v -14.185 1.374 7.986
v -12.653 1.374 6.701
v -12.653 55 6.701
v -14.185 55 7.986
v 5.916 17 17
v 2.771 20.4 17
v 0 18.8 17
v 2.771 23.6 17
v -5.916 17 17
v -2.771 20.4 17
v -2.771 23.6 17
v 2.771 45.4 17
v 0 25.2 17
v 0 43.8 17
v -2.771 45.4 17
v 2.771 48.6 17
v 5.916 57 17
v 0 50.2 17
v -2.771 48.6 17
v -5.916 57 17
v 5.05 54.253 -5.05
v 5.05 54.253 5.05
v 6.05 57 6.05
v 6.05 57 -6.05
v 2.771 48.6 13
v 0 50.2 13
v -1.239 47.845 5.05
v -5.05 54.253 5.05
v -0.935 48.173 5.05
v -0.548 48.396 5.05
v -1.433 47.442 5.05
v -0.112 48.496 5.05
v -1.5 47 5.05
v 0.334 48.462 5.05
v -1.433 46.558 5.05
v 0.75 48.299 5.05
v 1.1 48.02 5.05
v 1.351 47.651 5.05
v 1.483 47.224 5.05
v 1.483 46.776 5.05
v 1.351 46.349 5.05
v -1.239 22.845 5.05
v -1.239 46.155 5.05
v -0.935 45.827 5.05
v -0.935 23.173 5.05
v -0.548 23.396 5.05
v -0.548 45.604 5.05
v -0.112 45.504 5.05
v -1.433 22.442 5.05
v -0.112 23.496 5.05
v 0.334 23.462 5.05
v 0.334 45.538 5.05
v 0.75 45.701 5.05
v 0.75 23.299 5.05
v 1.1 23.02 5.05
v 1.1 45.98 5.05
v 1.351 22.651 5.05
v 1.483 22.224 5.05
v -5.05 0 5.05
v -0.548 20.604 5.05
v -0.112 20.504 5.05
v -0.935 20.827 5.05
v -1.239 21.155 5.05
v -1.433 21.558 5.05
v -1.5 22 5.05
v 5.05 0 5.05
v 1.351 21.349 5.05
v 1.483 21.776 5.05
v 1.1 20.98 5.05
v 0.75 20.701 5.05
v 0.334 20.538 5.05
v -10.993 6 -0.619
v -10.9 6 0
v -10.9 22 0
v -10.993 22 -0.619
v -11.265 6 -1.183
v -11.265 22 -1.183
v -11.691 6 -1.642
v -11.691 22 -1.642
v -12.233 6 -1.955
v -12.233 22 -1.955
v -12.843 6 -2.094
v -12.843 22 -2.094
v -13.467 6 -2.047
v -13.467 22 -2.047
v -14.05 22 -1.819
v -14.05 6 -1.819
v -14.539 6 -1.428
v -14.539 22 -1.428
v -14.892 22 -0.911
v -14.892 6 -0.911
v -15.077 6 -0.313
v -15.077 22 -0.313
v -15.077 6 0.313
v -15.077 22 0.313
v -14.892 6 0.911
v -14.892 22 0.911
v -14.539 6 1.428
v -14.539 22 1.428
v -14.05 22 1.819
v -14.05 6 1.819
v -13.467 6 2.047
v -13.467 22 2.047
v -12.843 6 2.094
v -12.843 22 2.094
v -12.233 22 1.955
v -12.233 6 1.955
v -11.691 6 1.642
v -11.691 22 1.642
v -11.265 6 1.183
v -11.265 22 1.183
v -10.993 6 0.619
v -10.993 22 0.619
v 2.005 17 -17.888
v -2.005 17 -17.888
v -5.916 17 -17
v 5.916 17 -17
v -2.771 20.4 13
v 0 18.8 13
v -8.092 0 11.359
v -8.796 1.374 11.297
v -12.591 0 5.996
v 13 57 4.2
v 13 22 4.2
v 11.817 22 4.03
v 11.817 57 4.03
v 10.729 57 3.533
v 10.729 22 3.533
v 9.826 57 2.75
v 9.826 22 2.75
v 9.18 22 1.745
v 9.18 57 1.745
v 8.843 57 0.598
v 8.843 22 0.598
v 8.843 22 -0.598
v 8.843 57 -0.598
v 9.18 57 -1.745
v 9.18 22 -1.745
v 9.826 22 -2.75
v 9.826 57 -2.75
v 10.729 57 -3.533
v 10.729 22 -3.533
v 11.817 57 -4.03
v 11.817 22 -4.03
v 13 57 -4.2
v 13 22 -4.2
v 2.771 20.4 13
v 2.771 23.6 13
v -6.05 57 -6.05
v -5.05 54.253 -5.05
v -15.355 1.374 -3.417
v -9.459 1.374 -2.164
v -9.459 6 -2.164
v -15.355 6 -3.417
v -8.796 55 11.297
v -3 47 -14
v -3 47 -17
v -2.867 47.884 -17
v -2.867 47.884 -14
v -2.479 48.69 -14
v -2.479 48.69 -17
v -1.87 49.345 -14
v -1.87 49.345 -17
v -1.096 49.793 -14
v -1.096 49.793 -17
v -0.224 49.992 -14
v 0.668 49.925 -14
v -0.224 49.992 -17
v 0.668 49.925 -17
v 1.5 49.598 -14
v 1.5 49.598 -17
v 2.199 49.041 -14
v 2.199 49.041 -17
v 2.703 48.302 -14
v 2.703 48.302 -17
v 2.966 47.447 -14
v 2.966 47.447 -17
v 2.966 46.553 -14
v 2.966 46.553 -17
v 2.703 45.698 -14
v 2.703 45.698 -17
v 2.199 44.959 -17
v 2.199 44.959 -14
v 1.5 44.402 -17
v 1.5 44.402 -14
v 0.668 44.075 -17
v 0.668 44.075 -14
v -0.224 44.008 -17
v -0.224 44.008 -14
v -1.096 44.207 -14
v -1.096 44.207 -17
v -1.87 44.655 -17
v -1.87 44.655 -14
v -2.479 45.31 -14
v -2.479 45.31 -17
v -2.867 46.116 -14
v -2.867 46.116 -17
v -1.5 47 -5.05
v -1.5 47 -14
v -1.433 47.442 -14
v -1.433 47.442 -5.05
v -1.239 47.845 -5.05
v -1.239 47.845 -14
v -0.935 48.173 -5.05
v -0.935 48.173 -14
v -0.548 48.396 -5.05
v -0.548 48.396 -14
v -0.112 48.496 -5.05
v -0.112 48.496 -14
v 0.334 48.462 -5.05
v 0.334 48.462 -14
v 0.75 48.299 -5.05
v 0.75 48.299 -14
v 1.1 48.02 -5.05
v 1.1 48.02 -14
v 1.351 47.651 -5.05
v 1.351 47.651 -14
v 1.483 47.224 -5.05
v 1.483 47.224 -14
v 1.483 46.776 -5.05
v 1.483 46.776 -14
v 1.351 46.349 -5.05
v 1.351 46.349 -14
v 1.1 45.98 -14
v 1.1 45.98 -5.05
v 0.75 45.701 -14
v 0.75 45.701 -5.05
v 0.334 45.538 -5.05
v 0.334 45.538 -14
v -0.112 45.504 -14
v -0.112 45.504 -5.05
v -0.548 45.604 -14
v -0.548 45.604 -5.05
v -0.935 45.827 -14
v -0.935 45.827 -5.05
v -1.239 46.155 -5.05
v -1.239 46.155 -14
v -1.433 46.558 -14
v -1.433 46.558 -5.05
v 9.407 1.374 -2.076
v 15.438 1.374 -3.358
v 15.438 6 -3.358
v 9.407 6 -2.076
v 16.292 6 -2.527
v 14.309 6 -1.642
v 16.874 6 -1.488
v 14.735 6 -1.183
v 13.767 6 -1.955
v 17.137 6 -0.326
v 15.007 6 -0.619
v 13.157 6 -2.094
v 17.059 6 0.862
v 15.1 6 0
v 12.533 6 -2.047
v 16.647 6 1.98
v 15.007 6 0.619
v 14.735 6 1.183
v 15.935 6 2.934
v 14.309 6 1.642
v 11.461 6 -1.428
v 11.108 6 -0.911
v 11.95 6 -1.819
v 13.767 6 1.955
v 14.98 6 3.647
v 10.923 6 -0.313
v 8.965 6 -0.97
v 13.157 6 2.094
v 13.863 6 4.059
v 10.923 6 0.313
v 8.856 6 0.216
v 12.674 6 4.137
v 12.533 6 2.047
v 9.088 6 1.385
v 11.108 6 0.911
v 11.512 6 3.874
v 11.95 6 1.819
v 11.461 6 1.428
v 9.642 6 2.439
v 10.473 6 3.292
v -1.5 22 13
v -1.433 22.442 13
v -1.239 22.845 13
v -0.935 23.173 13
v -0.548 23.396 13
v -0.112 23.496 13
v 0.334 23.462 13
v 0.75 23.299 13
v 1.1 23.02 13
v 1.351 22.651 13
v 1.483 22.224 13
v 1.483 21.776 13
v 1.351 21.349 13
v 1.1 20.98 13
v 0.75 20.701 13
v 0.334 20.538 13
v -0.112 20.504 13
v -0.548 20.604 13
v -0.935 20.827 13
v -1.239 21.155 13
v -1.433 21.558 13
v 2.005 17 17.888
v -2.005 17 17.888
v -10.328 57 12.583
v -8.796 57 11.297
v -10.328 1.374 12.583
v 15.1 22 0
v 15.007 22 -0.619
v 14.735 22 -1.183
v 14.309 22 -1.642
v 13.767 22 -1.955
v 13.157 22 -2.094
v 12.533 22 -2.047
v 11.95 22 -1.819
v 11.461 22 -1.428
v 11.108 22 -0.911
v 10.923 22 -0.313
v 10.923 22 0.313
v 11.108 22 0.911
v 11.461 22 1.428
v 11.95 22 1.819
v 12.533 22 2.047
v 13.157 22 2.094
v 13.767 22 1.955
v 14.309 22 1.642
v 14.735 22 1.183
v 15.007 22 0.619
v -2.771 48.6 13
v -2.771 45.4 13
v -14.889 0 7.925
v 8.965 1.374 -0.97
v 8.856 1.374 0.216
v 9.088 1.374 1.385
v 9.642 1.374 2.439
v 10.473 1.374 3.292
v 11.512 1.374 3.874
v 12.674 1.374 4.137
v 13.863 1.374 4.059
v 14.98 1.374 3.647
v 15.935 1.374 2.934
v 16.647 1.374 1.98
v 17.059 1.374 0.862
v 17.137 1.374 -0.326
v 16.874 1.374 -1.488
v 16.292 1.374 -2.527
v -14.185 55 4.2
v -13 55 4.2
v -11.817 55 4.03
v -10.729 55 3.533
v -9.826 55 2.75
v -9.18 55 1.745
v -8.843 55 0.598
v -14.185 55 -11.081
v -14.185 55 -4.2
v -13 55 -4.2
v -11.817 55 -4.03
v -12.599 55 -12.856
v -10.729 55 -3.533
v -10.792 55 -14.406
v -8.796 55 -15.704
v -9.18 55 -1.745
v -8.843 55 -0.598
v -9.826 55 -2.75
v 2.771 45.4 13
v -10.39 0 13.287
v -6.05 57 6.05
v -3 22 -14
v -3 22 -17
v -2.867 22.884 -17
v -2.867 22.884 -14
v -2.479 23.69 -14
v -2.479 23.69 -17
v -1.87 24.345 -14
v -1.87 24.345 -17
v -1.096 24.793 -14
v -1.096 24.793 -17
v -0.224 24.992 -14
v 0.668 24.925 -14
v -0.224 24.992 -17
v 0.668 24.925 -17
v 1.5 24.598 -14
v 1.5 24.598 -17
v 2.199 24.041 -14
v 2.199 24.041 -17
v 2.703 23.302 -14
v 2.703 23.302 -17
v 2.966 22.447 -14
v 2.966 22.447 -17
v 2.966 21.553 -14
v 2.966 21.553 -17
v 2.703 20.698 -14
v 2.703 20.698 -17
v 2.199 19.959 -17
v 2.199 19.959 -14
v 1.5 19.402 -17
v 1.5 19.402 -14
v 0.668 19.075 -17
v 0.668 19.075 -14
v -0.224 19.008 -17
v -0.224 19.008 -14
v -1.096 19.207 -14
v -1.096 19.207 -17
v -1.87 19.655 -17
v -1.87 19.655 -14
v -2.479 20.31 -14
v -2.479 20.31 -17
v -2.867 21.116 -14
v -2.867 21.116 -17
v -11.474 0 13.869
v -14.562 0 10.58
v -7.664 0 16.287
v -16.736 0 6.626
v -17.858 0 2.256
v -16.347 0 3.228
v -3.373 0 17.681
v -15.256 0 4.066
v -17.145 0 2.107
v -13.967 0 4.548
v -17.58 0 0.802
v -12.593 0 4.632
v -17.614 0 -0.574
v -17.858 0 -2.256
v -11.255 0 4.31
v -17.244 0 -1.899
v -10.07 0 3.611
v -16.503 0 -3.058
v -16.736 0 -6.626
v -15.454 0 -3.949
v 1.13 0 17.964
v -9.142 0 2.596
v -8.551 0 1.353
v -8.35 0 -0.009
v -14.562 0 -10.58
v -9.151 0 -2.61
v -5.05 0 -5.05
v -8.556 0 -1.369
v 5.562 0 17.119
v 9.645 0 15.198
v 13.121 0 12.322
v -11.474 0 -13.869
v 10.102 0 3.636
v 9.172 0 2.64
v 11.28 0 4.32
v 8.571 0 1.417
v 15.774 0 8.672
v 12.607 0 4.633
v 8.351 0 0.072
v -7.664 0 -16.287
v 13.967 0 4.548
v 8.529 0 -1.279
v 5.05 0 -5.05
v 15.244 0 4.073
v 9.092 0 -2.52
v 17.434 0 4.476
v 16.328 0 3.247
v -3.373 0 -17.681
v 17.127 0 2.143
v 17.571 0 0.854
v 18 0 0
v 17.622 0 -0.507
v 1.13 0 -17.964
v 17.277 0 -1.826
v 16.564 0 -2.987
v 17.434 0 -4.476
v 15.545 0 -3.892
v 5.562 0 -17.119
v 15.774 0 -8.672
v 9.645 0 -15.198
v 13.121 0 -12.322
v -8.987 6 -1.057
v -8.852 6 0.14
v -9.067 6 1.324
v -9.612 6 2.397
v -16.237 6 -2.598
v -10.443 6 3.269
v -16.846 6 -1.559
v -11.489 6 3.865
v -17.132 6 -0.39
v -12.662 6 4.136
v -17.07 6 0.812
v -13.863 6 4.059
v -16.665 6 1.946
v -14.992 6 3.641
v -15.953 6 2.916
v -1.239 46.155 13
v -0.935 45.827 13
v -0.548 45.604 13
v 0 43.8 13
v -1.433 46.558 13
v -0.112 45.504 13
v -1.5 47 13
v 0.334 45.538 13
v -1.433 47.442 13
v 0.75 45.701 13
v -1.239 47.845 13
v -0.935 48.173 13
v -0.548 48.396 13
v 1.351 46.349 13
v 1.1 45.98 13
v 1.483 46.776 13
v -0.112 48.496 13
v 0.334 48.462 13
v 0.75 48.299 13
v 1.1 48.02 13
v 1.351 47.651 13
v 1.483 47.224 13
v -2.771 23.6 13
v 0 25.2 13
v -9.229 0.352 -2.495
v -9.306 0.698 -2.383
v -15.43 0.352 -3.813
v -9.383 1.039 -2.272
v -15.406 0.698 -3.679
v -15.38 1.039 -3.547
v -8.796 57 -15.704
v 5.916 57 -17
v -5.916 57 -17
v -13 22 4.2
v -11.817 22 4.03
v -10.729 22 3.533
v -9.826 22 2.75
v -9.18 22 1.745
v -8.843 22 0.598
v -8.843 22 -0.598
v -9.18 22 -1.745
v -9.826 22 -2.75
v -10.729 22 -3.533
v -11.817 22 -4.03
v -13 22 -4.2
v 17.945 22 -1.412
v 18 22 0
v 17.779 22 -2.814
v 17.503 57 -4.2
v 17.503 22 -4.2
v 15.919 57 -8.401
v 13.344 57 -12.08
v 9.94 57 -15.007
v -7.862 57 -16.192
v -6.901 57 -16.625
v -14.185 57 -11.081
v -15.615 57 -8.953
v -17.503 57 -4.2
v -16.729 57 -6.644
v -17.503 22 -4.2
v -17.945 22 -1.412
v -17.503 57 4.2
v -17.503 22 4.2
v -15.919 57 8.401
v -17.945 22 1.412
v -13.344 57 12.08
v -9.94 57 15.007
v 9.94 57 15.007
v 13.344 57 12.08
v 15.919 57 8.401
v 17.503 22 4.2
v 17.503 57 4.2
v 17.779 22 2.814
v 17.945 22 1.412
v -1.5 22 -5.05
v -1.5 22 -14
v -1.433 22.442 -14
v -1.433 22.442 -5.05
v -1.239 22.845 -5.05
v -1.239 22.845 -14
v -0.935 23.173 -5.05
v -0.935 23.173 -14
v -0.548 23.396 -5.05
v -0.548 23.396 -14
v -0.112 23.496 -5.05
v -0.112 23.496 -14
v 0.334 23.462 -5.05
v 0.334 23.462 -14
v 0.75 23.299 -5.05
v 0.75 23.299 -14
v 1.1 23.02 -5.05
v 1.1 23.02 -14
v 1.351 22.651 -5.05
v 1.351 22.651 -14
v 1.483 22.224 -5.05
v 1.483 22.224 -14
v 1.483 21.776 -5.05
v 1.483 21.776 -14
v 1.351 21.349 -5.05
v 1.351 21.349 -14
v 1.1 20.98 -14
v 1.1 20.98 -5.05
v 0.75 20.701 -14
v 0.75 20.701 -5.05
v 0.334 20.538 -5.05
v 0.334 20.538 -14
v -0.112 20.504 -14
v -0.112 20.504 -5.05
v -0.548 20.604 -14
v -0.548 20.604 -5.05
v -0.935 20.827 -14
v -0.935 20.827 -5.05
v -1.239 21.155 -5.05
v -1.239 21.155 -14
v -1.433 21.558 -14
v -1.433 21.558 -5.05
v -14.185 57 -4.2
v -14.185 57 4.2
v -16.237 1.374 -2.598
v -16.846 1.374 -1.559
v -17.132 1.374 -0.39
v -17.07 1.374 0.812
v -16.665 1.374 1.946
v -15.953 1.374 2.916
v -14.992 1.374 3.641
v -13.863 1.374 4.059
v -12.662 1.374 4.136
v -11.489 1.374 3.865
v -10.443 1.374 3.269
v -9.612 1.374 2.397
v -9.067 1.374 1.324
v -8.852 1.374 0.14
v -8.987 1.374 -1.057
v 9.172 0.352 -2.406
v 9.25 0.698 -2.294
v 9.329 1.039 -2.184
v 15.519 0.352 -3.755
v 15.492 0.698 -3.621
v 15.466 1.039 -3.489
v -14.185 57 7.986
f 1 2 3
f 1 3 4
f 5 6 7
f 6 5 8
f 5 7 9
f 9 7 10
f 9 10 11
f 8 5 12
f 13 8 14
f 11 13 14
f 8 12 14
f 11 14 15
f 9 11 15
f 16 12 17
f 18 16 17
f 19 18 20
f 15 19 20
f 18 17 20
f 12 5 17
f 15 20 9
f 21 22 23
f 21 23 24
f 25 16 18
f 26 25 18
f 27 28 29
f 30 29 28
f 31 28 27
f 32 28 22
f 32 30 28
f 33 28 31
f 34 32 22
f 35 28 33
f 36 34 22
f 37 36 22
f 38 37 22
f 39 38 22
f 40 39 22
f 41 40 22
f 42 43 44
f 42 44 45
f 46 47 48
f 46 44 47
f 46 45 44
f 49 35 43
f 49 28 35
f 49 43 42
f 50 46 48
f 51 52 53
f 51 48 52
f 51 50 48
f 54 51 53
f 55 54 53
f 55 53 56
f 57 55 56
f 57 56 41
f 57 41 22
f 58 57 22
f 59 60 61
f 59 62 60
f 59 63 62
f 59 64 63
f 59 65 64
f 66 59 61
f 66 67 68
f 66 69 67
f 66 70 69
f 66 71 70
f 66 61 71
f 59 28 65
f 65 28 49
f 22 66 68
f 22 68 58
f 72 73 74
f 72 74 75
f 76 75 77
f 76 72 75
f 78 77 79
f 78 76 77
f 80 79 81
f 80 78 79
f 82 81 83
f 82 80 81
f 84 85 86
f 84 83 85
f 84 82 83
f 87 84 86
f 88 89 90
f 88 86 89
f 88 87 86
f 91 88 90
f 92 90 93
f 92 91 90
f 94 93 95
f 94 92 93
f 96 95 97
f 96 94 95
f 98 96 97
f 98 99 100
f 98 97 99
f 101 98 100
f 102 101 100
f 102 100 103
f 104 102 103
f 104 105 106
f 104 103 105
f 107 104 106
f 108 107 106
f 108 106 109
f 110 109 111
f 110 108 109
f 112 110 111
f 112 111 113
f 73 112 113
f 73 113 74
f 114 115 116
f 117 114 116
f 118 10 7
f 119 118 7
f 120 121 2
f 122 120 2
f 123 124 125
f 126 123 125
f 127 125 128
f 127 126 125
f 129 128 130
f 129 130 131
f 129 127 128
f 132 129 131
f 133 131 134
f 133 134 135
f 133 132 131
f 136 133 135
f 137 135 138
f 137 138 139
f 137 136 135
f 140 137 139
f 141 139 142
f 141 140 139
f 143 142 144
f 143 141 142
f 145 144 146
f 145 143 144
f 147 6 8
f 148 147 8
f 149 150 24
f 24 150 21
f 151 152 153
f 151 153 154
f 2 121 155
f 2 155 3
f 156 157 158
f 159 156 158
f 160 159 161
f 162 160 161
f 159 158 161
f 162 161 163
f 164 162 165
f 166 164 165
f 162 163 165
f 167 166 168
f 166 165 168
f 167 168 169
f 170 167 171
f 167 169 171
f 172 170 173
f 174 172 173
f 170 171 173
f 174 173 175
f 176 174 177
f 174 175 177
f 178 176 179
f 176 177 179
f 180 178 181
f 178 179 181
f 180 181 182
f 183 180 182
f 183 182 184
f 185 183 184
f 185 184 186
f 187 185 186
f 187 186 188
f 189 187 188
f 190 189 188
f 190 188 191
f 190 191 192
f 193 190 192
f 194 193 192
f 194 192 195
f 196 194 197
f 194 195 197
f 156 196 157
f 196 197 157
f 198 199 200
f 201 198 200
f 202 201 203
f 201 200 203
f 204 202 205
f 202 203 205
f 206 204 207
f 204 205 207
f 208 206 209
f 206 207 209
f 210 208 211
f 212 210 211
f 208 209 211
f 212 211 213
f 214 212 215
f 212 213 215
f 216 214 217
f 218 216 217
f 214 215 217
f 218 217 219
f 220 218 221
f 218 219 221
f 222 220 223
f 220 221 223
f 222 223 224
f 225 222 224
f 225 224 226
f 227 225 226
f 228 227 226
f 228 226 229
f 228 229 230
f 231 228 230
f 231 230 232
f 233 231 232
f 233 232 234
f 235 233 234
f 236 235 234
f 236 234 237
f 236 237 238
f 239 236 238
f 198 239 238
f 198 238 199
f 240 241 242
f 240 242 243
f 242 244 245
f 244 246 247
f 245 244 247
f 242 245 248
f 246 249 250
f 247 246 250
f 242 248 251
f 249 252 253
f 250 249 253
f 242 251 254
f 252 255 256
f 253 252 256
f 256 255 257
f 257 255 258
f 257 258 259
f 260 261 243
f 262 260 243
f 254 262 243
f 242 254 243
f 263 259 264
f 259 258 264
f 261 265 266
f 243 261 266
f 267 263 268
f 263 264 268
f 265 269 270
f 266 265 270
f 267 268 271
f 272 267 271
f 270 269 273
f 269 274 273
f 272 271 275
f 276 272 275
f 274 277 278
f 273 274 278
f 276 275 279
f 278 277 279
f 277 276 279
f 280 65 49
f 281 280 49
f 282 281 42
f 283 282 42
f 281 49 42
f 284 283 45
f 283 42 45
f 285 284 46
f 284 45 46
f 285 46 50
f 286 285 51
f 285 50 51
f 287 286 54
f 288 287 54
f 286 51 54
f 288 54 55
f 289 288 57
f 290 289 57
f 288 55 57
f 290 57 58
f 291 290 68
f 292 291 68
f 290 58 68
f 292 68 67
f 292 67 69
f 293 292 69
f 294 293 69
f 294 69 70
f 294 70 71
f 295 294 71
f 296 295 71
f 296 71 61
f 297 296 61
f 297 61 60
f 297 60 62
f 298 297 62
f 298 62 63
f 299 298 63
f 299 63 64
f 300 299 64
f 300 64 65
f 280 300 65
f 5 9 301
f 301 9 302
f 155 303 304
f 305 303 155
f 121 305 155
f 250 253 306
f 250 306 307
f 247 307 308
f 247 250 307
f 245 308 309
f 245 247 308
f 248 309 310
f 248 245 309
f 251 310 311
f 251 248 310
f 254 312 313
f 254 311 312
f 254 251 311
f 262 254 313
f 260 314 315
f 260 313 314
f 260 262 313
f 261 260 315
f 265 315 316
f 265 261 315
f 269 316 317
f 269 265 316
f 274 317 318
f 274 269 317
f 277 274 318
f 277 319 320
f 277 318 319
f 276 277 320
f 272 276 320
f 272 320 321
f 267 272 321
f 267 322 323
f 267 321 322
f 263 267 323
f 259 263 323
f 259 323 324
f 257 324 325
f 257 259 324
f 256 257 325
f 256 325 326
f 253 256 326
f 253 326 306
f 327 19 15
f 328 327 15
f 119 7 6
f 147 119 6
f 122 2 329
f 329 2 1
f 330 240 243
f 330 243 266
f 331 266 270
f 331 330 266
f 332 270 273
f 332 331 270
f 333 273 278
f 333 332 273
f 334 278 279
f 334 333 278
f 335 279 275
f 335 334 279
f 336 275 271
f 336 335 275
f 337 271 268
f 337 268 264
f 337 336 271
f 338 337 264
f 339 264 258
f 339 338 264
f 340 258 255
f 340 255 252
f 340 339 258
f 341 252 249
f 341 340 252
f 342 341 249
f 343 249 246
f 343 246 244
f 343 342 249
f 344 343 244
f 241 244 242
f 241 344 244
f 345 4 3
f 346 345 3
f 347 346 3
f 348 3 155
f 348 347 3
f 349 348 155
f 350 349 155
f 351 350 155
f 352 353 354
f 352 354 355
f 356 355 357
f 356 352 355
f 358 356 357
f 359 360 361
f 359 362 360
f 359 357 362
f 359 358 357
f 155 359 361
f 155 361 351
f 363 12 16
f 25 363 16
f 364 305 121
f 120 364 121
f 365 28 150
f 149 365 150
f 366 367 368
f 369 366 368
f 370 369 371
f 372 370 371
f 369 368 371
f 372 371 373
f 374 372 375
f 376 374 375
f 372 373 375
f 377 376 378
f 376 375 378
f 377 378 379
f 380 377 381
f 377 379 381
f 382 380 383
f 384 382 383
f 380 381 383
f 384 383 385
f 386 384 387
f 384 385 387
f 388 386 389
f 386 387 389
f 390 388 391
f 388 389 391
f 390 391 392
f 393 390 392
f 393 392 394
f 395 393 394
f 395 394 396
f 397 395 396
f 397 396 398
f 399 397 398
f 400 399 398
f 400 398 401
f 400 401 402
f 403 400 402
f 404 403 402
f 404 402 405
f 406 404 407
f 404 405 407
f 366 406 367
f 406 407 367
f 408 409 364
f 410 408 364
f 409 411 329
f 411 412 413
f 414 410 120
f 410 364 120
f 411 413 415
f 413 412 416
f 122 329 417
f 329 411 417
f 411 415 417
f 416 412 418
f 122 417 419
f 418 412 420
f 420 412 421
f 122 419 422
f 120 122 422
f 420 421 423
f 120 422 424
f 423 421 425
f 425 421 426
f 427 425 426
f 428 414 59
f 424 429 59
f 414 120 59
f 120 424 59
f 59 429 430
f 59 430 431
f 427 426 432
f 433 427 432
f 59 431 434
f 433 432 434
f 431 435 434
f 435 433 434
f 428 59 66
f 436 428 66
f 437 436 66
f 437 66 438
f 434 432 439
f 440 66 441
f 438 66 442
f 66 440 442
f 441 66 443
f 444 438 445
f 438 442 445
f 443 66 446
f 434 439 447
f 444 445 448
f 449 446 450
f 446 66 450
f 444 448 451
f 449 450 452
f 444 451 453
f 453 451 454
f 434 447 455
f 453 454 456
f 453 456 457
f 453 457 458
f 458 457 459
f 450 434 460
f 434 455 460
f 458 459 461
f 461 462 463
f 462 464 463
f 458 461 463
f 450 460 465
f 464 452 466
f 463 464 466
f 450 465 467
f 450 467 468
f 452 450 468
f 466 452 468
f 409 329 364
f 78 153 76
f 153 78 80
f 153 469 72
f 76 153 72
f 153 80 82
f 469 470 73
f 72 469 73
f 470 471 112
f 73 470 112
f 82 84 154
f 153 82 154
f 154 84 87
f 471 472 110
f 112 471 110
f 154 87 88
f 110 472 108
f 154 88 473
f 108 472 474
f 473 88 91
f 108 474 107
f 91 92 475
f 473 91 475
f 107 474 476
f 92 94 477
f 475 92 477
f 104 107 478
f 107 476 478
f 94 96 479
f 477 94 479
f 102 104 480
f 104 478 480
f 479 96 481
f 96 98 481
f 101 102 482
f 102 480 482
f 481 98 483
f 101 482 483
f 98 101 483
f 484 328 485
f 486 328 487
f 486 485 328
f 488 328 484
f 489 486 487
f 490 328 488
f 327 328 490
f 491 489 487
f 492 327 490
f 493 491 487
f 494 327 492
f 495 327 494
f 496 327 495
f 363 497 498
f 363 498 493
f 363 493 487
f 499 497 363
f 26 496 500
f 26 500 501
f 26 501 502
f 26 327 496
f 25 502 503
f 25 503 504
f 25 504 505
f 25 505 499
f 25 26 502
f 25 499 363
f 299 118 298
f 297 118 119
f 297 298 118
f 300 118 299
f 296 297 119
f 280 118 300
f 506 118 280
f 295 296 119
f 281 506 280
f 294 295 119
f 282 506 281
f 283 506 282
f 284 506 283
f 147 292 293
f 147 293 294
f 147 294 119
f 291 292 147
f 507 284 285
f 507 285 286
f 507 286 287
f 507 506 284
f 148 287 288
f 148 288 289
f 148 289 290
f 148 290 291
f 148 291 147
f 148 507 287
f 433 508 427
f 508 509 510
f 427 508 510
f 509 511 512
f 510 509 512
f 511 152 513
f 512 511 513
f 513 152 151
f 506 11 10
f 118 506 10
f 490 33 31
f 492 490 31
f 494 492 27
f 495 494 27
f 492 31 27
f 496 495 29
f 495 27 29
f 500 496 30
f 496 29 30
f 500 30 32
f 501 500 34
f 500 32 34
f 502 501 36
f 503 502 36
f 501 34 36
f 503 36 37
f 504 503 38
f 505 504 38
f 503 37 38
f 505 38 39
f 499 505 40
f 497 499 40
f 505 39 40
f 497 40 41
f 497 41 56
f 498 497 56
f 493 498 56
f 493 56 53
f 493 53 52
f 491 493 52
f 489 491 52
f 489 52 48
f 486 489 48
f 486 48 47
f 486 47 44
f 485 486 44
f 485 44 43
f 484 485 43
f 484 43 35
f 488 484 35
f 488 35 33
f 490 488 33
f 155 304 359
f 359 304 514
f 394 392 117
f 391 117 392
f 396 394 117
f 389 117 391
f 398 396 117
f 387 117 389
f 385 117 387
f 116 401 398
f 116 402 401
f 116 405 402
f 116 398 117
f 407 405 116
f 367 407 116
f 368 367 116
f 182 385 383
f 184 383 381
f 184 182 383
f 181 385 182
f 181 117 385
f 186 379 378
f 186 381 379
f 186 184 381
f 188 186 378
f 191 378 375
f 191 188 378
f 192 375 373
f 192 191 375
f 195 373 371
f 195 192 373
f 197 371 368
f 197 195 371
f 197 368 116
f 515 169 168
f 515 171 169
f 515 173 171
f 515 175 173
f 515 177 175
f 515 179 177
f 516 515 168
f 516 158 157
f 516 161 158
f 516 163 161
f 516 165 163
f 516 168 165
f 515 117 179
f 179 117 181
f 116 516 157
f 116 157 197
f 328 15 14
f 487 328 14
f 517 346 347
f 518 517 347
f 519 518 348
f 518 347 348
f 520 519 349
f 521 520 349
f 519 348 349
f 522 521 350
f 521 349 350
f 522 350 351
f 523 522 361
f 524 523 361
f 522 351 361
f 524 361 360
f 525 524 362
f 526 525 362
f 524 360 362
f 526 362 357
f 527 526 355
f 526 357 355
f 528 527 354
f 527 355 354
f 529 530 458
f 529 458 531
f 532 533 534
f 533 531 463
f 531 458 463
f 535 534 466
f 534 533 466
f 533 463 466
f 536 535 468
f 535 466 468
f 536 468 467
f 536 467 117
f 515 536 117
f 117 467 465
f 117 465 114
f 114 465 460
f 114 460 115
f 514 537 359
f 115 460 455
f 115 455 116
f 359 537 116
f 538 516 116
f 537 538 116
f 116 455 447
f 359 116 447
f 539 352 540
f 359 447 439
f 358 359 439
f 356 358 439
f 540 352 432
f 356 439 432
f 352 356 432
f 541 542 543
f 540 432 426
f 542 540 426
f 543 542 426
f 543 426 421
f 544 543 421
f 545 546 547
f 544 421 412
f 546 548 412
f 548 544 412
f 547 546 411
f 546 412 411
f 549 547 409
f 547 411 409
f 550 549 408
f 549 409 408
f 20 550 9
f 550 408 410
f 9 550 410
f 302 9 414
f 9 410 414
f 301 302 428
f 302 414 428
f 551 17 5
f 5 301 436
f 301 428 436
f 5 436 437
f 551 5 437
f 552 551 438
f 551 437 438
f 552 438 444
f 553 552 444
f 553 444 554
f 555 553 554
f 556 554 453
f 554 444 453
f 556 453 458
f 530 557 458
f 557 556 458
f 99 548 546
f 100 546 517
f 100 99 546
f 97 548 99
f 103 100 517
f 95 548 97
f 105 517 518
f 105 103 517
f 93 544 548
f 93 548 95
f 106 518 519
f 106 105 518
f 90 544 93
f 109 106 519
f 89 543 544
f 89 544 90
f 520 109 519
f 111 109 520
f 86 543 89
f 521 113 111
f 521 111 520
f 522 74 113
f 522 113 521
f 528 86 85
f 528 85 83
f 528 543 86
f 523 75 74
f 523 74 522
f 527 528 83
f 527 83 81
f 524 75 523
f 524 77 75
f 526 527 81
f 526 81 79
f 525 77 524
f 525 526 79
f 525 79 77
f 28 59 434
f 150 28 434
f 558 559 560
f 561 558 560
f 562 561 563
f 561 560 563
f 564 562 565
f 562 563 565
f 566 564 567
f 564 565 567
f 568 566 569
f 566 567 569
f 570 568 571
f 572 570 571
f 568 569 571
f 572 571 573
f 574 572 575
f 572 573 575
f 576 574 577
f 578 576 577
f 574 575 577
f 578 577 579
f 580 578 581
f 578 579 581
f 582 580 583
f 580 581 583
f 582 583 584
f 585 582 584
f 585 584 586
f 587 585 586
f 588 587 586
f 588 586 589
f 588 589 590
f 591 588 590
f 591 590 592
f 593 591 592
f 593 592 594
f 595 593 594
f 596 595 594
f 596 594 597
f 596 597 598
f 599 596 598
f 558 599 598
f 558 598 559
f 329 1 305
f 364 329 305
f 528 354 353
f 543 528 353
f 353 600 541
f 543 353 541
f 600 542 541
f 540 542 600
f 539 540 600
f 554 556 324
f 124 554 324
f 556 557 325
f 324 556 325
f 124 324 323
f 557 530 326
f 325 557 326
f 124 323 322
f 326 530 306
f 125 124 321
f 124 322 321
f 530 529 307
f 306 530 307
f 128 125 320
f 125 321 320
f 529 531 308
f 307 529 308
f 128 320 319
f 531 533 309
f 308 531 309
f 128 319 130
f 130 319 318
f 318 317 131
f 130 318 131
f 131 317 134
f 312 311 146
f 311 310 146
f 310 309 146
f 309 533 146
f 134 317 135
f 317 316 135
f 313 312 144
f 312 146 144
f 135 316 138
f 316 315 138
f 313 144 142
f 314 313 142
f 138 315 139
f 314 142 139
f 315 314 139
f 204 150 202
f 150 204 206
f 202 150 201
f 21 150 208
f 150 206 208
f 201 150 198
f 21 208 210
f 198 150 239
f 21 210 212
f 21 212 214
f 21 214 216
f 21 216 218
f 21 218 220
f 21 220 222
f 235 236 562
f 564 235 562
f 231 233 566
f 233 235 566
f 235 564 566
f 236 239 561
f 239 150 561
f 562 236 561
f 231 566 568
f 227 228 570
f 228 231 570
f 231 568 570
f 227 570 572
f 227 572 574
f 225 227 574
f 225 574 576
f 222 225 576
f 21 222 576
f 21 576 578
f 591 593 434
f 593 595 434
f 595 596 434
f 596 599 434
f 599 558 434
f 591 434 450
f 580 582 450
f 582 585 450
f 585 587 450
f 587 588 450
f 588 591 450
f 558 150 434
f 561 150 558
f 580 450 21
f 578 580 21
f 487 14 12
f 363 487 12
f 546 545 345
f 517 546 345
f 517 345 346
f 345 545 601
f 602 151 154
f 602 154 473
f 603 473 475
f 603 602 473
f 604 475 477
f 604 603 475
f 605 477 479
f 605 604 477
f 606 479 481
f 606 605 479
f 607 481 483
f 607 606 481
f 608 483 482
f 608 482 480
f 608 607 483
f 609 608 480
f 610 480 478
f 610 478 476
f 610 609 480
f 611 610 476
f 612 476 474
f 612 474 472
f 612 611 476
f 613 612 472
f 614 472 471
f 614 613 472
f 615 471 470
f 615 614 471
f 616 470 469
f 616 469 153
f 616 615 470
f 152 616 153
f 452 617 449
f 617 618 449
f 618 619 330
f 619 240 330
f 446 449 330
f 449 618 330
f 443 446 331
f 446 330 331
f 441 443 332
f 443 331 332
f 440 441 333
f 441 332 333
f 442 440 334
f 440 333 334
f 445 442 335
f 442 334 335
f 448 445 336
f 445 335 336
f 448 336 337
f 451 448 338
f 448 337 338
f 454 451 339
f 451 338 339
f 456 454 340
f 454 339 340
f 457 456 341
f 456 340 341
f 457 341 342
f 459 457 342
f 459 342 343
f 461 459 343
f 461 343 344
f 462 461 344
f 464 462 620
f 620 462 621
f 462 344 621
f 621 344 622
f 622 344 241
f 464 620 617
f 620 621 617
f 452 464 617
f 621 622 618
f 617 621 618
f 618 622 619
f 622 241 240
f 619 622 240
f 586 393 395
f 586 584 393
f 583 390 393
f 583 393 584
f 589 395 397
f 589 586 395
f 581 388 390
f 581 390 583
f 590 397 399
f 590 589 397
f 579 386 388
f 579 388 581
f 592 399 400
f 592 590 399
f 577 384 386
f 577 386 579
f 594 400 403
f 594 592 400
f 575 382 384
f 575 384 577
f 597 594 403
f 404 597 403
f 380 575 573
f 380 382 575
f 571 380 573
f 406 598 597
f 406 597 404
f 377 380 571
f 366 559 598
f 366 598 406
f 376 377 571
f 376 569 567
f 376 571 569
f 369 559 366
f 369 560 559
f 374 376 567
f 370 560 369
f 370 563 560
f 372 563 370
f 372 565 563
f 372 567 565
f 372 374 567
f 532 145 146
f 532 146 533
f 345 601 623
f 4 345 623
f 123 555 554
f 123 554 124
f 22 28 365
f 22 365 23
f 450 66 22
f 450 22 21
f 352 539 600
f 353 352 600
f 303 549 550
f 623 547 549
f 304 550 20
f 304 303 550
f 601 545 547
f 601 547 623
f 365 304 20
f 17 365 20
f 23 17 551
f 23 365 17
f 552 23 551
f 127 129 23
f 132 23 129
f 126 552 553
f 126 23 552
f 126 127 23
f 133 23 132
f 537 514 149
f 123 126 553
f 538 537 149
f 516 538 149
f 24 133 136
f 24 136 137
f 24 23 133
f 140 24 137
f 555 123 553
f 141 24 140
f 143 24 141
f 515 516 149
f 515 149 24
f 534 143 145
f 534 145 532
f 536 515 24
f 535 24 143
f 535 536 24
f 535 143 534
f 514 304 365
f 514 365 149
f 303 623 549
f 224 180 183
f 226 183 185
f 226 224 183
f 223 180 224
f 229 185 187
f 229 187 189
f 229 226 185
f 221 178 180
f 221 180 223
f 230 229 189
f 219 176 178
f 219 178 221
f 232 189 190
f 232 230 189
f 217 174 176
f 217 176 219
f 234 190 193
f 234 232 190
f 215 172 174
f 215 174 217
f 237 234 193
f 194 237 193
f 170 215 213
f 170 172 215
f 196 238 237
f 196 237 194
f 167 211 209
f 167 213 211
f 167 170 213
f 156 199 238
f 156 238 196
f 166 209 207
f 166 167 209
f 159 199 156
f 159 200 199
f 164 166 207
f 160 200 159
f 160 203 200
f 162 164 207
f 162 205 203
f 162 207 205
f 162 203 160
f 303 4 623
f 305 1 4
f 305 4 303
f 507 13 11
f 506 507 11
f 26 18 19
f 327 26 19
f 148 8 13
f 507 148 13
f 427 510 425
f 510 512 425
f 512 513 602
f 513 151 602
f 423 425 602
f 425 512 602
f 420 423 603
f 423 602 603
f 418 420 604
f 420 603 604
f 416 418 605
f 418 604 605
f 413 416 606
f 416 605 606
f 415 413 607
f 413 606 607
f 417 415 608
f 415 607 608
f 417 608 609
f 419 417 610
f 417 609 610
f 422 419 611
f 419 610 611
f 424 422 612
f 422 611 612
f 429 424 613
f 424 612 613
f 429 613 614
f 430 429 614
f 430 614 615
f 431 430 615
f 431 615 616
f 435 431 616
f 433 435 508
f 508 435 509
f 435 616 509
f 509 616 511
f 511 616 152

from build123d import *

# Parameters (mm, degrees)
SKETCH1_R           = 18
SKETCH1_R_2         = 2.1
SKETCH1_W           = 10.1
SKETCH1_H           = 10.1
BOSS_EXTRUDE1_DEPTH = 57
CUT_EXTRUDE4_DEPTH  = 40
SKETCH6_R           = 1.5
CUT_EXTRUDE5_DEPTH  = 36
SKETCH7_R           = 3
CUT_EXTRUDE6_DEPTH  = 3
CUT_EXTRUDE7_DEPTH  = 4
CHAMFER1_SIZE       = 1
CHAMFER1_SIZE2      = 2.747477419
CUT_EXTRUDE9_DEPTH  = 6
CHAMFER2_SIZE       = 0.5
CHAMFER2_SIZE2      = 1.37373871
CUT_EXTRUDE10_DEPTH = 35
CUT_EXTRUDE11_DEPTH = 58
CHAMFER3_SIZE       = 0.5
CHAMFER3_SIZE2      = 1.37373871
CUT_EXTRUDE13_DEPTH = 2


with BuildPart() as part:
    # Sketch1 → Boss-Extrude1 (new body)
    with BuildSketch(Plane(origin=(0, 0, 0), x_dir=(1, 0, 0), z_dir=(0, 1, 0))):
        Circle(SKETCH1_R)
        with Locations((13, 0)):
            Circle(SKETCH1_R_2, mode=Mode.SUBTRACT)
        with Locations((-13, 0)):
            Circle(SKETCH1_R_2, mode=Mode.SUBTRACT)
        Rectangle(SKETCH1_W, SKETCH1_H, mode=Mode.SUBTRACT)
    extrude(amount=BOSS_EXTRUDE1_DEPTH)

    # Sketch5 → Cut-Extrude4 (cut)
    with BuildSketch(Plane(origin=(0, 57, 0), x_dir=(1, 0, 0), z_dir=(0, 1, 0))):
        with BuildLine():
            Line((5.916079783, 17), (-5.916079783, 17))
            ThreePointArc((-5.916079783, 17), (0, 18), (5.916079783, 17))
        make_face()
        with BuildLine():
            Line((5.916079783, -17), (-5.916079783, -17))
            ThreePointArc((-5.916079783, -17), (0, -18), (5.916079783, -17))
        make_face()
    extrude(amount=-CUT_EXTRUDE4_DEPTH, mode=Mode.SUBTRACT)

    # Sketch6 → Cut-Extrude5 (cut, through all)
    with BuildSketch(Plane(origin=(0, 0, -17), x_dir=(-1, 0, 0), z_dir=(0, 0, -1))):
        with Locations((0, 47)):
            Circle(SKETCH6_R)
        with Locations((0, 22)):
            Circle(SKETCH6_R)
    extrude(amount=-CUT_EXTRUDE5_DEPTH, mode=Mode.SUBTRACT)

    # Sketch7 → Cut-Extrude6 (cut)
    with BuildSketch(Plane(origin=(0, 0, -17), x_dir=(-1, 0, 0), z_dir=(0, 0, -1))):
        with Locations((0, 47)):
            Circle(SKETCH7_R)
        with Locations((0, 22)):
            Circle(SKETCH7_R)
    extrude(amount=-CUT_EXTRUDE6_DEPTH, mode=Mode.SUBTRACT)

    # Sketch8 → Cut-Extrude7 (cut)
    with BuildSketch(Plane.XY.offset(17)):
        Polygon((0, 43.8), (2.771281292, 45.4), (2.771281292, 48.6), (0, 50.2), (-2.771281292, 48.6), (-2.771281292, 45.4), align=None)
        Polygon((0, 18.8), (2.771281292, 20.4), (2.771281292, 23.6), (0, 25.2), (-2.771281292, 23.6), (-2.771281292, 20.4), align=None)
    extrude(amount=-CUT_EXTRUDE7_DEPTH, mode=Mode.SUBTRACT)

    # Chamfer1
    chamfer1_edges = [part.edges().sort_by_distance(p)[0] for p in [
        (0, 57, -5.05),
        (-5.05, 57, 0),
        (0, 57, 5.05),
        (5.05, 57, 0),
    ]]
    chamfer1_side = [part.faces().sort_by_distance(p)[0] for p in [
        (14.267618119, 57, 10.141691708),
    ]]
    chamfer(chamfer1_edges, length=CHAMFER1_SIZE, length2=CHAMFER1_SIZE2, reference=chamfer1_side[0])

    # Sketch9 → Cut-Extrude9 (cut)
    with BuildSketch(Plane.XZ):
        with BuildLine():
            Line((15.438263477, -3.358179747), (9.406640719, -2.076118753))
            ThreePointArc((9.406640719, -2.076118753), (13.862833517, 4.059312543), (15.438263477, -3.358179747))
        make_face()
        with BuildLine():
            Line((-9.458796565, -2.163880365), (-15.354920877, -3.417140276))
            ThreePointArc((-15.354920877, -3.417140276), (-13.862833517, 4.059312543), (-9.458796565, -2.163880365))
        make_face()
    extrude(amount=-CUT_EXTRUDE9_DEPTH, mode=Mode.SUBTRACT)

    # Chamfer2
    chamfer2_edges = [part.edges().sort_by_distance(p)[0] for p in [
        (13.862833517, 0, 4.059312543),
        (12.422452098, 0, -2.71714925),
        (-13.862833517, 0, 4.059312543),
        (-12.406858721, 0, -2.79051032),
    ]]
    chamfer2_side = [part.faces().sort_by_distance(p)[0] for p in [
        (-17.490883118, 0, 0),
    ]]
    chamfer(chamfer2_edges, length=CHAMFER2_SIZE, length2=CHAMFER2_SIZE2, reference=chamfer2_side[0])

    # Sketch10 → Cut-Extrude10 (cut)
    with BuildSketch(Plane(origin=(0, 57, 0), x_dir=(1, 0, 0), z_dir=(0, 1, 0))):
        with BuildLine():
            Line((13, 4.2), (21, 4.2))
            Line((21, 4.2), (21, -4.2))
            Line((21, -4.2), (13, -4.2))
            ThreePointArc((13, -4.2), (8.8, 0), (13, 4.2))
        make_face()
        with BuildLine():
            Line((-13, 4.2), (-21, 4.2))
            Line((-21, 4.2), (-21, -4.2))
            Line((-21, -4.2), (-13, -4.2))
            ThreePointArc((-13, -4.2), (-8.8, 0), (-13, 4.2))
        make_face()
    extrude(amount=-CUT_EXTRUDE10_DEPTH, mode=Mode.SUBTRACT)

    # Sketch11 → Cut-Extrude11 (cut, through all)
    with BuildSketch(Plane.XZ):
        Polygon((-14.185073919, 7.986468426), (-10.328348261, 12.582735084), (-8.796259375, 11.297159865), (-12.652985033, 6.700893206), align=None)
    extrude(amount=-CUT_EXTRUDE11_DEPTH, mode=Mode.SUBTRACT)

    # Chamfer3
    chamfer3_edges = [part.edges().sort_by_distance(p)[0] for p in [
        (-13.419029476, 0, 7.343680816),
        (-10.724622204, 0, 8.999026536),
        (-9.562303818, 0, 11.939947475),
        (-12.25671109, 0, 10.284601755),
    ]]
    chamfer3_side = [part.faces().sort_by_distance(p)[0] for p in [
        (-17.949088312, 0, 0),
    ]]
    chamfer(chamfer3_edges, length=CHAMFER3_SIZE, length2=CHAMFER3_SIZE2, reference=chamfer3_side[0])

    # Sketch13 → Cut-Extrude13 (cut)
    with BuildSketch(Plane(origin=(0, 57, 0), x_dir=(1, 0, 0), z_dir=(0, 1, 0))):
        with BuildLine():
            Line((-8.796259375, -11.297159865), (-8.796259375, 15.704324914))
            ThreePointArc((-8.796259375, 15.704324914), (-11.720909208, 13.660903606), (-14.185073919, 11.080779662))
            Line((-14.185073919, 11.080779662), (-14.185073919, -7.986468426))
            Line((-14.185073919, -7.986468426), (-8.796259375, -11.297159865))
        make_face()
    extrude(amount=-CUT_EXTRUDE13_DEPTH, mode=Mode.SUBTRACT)


solid = part.part
